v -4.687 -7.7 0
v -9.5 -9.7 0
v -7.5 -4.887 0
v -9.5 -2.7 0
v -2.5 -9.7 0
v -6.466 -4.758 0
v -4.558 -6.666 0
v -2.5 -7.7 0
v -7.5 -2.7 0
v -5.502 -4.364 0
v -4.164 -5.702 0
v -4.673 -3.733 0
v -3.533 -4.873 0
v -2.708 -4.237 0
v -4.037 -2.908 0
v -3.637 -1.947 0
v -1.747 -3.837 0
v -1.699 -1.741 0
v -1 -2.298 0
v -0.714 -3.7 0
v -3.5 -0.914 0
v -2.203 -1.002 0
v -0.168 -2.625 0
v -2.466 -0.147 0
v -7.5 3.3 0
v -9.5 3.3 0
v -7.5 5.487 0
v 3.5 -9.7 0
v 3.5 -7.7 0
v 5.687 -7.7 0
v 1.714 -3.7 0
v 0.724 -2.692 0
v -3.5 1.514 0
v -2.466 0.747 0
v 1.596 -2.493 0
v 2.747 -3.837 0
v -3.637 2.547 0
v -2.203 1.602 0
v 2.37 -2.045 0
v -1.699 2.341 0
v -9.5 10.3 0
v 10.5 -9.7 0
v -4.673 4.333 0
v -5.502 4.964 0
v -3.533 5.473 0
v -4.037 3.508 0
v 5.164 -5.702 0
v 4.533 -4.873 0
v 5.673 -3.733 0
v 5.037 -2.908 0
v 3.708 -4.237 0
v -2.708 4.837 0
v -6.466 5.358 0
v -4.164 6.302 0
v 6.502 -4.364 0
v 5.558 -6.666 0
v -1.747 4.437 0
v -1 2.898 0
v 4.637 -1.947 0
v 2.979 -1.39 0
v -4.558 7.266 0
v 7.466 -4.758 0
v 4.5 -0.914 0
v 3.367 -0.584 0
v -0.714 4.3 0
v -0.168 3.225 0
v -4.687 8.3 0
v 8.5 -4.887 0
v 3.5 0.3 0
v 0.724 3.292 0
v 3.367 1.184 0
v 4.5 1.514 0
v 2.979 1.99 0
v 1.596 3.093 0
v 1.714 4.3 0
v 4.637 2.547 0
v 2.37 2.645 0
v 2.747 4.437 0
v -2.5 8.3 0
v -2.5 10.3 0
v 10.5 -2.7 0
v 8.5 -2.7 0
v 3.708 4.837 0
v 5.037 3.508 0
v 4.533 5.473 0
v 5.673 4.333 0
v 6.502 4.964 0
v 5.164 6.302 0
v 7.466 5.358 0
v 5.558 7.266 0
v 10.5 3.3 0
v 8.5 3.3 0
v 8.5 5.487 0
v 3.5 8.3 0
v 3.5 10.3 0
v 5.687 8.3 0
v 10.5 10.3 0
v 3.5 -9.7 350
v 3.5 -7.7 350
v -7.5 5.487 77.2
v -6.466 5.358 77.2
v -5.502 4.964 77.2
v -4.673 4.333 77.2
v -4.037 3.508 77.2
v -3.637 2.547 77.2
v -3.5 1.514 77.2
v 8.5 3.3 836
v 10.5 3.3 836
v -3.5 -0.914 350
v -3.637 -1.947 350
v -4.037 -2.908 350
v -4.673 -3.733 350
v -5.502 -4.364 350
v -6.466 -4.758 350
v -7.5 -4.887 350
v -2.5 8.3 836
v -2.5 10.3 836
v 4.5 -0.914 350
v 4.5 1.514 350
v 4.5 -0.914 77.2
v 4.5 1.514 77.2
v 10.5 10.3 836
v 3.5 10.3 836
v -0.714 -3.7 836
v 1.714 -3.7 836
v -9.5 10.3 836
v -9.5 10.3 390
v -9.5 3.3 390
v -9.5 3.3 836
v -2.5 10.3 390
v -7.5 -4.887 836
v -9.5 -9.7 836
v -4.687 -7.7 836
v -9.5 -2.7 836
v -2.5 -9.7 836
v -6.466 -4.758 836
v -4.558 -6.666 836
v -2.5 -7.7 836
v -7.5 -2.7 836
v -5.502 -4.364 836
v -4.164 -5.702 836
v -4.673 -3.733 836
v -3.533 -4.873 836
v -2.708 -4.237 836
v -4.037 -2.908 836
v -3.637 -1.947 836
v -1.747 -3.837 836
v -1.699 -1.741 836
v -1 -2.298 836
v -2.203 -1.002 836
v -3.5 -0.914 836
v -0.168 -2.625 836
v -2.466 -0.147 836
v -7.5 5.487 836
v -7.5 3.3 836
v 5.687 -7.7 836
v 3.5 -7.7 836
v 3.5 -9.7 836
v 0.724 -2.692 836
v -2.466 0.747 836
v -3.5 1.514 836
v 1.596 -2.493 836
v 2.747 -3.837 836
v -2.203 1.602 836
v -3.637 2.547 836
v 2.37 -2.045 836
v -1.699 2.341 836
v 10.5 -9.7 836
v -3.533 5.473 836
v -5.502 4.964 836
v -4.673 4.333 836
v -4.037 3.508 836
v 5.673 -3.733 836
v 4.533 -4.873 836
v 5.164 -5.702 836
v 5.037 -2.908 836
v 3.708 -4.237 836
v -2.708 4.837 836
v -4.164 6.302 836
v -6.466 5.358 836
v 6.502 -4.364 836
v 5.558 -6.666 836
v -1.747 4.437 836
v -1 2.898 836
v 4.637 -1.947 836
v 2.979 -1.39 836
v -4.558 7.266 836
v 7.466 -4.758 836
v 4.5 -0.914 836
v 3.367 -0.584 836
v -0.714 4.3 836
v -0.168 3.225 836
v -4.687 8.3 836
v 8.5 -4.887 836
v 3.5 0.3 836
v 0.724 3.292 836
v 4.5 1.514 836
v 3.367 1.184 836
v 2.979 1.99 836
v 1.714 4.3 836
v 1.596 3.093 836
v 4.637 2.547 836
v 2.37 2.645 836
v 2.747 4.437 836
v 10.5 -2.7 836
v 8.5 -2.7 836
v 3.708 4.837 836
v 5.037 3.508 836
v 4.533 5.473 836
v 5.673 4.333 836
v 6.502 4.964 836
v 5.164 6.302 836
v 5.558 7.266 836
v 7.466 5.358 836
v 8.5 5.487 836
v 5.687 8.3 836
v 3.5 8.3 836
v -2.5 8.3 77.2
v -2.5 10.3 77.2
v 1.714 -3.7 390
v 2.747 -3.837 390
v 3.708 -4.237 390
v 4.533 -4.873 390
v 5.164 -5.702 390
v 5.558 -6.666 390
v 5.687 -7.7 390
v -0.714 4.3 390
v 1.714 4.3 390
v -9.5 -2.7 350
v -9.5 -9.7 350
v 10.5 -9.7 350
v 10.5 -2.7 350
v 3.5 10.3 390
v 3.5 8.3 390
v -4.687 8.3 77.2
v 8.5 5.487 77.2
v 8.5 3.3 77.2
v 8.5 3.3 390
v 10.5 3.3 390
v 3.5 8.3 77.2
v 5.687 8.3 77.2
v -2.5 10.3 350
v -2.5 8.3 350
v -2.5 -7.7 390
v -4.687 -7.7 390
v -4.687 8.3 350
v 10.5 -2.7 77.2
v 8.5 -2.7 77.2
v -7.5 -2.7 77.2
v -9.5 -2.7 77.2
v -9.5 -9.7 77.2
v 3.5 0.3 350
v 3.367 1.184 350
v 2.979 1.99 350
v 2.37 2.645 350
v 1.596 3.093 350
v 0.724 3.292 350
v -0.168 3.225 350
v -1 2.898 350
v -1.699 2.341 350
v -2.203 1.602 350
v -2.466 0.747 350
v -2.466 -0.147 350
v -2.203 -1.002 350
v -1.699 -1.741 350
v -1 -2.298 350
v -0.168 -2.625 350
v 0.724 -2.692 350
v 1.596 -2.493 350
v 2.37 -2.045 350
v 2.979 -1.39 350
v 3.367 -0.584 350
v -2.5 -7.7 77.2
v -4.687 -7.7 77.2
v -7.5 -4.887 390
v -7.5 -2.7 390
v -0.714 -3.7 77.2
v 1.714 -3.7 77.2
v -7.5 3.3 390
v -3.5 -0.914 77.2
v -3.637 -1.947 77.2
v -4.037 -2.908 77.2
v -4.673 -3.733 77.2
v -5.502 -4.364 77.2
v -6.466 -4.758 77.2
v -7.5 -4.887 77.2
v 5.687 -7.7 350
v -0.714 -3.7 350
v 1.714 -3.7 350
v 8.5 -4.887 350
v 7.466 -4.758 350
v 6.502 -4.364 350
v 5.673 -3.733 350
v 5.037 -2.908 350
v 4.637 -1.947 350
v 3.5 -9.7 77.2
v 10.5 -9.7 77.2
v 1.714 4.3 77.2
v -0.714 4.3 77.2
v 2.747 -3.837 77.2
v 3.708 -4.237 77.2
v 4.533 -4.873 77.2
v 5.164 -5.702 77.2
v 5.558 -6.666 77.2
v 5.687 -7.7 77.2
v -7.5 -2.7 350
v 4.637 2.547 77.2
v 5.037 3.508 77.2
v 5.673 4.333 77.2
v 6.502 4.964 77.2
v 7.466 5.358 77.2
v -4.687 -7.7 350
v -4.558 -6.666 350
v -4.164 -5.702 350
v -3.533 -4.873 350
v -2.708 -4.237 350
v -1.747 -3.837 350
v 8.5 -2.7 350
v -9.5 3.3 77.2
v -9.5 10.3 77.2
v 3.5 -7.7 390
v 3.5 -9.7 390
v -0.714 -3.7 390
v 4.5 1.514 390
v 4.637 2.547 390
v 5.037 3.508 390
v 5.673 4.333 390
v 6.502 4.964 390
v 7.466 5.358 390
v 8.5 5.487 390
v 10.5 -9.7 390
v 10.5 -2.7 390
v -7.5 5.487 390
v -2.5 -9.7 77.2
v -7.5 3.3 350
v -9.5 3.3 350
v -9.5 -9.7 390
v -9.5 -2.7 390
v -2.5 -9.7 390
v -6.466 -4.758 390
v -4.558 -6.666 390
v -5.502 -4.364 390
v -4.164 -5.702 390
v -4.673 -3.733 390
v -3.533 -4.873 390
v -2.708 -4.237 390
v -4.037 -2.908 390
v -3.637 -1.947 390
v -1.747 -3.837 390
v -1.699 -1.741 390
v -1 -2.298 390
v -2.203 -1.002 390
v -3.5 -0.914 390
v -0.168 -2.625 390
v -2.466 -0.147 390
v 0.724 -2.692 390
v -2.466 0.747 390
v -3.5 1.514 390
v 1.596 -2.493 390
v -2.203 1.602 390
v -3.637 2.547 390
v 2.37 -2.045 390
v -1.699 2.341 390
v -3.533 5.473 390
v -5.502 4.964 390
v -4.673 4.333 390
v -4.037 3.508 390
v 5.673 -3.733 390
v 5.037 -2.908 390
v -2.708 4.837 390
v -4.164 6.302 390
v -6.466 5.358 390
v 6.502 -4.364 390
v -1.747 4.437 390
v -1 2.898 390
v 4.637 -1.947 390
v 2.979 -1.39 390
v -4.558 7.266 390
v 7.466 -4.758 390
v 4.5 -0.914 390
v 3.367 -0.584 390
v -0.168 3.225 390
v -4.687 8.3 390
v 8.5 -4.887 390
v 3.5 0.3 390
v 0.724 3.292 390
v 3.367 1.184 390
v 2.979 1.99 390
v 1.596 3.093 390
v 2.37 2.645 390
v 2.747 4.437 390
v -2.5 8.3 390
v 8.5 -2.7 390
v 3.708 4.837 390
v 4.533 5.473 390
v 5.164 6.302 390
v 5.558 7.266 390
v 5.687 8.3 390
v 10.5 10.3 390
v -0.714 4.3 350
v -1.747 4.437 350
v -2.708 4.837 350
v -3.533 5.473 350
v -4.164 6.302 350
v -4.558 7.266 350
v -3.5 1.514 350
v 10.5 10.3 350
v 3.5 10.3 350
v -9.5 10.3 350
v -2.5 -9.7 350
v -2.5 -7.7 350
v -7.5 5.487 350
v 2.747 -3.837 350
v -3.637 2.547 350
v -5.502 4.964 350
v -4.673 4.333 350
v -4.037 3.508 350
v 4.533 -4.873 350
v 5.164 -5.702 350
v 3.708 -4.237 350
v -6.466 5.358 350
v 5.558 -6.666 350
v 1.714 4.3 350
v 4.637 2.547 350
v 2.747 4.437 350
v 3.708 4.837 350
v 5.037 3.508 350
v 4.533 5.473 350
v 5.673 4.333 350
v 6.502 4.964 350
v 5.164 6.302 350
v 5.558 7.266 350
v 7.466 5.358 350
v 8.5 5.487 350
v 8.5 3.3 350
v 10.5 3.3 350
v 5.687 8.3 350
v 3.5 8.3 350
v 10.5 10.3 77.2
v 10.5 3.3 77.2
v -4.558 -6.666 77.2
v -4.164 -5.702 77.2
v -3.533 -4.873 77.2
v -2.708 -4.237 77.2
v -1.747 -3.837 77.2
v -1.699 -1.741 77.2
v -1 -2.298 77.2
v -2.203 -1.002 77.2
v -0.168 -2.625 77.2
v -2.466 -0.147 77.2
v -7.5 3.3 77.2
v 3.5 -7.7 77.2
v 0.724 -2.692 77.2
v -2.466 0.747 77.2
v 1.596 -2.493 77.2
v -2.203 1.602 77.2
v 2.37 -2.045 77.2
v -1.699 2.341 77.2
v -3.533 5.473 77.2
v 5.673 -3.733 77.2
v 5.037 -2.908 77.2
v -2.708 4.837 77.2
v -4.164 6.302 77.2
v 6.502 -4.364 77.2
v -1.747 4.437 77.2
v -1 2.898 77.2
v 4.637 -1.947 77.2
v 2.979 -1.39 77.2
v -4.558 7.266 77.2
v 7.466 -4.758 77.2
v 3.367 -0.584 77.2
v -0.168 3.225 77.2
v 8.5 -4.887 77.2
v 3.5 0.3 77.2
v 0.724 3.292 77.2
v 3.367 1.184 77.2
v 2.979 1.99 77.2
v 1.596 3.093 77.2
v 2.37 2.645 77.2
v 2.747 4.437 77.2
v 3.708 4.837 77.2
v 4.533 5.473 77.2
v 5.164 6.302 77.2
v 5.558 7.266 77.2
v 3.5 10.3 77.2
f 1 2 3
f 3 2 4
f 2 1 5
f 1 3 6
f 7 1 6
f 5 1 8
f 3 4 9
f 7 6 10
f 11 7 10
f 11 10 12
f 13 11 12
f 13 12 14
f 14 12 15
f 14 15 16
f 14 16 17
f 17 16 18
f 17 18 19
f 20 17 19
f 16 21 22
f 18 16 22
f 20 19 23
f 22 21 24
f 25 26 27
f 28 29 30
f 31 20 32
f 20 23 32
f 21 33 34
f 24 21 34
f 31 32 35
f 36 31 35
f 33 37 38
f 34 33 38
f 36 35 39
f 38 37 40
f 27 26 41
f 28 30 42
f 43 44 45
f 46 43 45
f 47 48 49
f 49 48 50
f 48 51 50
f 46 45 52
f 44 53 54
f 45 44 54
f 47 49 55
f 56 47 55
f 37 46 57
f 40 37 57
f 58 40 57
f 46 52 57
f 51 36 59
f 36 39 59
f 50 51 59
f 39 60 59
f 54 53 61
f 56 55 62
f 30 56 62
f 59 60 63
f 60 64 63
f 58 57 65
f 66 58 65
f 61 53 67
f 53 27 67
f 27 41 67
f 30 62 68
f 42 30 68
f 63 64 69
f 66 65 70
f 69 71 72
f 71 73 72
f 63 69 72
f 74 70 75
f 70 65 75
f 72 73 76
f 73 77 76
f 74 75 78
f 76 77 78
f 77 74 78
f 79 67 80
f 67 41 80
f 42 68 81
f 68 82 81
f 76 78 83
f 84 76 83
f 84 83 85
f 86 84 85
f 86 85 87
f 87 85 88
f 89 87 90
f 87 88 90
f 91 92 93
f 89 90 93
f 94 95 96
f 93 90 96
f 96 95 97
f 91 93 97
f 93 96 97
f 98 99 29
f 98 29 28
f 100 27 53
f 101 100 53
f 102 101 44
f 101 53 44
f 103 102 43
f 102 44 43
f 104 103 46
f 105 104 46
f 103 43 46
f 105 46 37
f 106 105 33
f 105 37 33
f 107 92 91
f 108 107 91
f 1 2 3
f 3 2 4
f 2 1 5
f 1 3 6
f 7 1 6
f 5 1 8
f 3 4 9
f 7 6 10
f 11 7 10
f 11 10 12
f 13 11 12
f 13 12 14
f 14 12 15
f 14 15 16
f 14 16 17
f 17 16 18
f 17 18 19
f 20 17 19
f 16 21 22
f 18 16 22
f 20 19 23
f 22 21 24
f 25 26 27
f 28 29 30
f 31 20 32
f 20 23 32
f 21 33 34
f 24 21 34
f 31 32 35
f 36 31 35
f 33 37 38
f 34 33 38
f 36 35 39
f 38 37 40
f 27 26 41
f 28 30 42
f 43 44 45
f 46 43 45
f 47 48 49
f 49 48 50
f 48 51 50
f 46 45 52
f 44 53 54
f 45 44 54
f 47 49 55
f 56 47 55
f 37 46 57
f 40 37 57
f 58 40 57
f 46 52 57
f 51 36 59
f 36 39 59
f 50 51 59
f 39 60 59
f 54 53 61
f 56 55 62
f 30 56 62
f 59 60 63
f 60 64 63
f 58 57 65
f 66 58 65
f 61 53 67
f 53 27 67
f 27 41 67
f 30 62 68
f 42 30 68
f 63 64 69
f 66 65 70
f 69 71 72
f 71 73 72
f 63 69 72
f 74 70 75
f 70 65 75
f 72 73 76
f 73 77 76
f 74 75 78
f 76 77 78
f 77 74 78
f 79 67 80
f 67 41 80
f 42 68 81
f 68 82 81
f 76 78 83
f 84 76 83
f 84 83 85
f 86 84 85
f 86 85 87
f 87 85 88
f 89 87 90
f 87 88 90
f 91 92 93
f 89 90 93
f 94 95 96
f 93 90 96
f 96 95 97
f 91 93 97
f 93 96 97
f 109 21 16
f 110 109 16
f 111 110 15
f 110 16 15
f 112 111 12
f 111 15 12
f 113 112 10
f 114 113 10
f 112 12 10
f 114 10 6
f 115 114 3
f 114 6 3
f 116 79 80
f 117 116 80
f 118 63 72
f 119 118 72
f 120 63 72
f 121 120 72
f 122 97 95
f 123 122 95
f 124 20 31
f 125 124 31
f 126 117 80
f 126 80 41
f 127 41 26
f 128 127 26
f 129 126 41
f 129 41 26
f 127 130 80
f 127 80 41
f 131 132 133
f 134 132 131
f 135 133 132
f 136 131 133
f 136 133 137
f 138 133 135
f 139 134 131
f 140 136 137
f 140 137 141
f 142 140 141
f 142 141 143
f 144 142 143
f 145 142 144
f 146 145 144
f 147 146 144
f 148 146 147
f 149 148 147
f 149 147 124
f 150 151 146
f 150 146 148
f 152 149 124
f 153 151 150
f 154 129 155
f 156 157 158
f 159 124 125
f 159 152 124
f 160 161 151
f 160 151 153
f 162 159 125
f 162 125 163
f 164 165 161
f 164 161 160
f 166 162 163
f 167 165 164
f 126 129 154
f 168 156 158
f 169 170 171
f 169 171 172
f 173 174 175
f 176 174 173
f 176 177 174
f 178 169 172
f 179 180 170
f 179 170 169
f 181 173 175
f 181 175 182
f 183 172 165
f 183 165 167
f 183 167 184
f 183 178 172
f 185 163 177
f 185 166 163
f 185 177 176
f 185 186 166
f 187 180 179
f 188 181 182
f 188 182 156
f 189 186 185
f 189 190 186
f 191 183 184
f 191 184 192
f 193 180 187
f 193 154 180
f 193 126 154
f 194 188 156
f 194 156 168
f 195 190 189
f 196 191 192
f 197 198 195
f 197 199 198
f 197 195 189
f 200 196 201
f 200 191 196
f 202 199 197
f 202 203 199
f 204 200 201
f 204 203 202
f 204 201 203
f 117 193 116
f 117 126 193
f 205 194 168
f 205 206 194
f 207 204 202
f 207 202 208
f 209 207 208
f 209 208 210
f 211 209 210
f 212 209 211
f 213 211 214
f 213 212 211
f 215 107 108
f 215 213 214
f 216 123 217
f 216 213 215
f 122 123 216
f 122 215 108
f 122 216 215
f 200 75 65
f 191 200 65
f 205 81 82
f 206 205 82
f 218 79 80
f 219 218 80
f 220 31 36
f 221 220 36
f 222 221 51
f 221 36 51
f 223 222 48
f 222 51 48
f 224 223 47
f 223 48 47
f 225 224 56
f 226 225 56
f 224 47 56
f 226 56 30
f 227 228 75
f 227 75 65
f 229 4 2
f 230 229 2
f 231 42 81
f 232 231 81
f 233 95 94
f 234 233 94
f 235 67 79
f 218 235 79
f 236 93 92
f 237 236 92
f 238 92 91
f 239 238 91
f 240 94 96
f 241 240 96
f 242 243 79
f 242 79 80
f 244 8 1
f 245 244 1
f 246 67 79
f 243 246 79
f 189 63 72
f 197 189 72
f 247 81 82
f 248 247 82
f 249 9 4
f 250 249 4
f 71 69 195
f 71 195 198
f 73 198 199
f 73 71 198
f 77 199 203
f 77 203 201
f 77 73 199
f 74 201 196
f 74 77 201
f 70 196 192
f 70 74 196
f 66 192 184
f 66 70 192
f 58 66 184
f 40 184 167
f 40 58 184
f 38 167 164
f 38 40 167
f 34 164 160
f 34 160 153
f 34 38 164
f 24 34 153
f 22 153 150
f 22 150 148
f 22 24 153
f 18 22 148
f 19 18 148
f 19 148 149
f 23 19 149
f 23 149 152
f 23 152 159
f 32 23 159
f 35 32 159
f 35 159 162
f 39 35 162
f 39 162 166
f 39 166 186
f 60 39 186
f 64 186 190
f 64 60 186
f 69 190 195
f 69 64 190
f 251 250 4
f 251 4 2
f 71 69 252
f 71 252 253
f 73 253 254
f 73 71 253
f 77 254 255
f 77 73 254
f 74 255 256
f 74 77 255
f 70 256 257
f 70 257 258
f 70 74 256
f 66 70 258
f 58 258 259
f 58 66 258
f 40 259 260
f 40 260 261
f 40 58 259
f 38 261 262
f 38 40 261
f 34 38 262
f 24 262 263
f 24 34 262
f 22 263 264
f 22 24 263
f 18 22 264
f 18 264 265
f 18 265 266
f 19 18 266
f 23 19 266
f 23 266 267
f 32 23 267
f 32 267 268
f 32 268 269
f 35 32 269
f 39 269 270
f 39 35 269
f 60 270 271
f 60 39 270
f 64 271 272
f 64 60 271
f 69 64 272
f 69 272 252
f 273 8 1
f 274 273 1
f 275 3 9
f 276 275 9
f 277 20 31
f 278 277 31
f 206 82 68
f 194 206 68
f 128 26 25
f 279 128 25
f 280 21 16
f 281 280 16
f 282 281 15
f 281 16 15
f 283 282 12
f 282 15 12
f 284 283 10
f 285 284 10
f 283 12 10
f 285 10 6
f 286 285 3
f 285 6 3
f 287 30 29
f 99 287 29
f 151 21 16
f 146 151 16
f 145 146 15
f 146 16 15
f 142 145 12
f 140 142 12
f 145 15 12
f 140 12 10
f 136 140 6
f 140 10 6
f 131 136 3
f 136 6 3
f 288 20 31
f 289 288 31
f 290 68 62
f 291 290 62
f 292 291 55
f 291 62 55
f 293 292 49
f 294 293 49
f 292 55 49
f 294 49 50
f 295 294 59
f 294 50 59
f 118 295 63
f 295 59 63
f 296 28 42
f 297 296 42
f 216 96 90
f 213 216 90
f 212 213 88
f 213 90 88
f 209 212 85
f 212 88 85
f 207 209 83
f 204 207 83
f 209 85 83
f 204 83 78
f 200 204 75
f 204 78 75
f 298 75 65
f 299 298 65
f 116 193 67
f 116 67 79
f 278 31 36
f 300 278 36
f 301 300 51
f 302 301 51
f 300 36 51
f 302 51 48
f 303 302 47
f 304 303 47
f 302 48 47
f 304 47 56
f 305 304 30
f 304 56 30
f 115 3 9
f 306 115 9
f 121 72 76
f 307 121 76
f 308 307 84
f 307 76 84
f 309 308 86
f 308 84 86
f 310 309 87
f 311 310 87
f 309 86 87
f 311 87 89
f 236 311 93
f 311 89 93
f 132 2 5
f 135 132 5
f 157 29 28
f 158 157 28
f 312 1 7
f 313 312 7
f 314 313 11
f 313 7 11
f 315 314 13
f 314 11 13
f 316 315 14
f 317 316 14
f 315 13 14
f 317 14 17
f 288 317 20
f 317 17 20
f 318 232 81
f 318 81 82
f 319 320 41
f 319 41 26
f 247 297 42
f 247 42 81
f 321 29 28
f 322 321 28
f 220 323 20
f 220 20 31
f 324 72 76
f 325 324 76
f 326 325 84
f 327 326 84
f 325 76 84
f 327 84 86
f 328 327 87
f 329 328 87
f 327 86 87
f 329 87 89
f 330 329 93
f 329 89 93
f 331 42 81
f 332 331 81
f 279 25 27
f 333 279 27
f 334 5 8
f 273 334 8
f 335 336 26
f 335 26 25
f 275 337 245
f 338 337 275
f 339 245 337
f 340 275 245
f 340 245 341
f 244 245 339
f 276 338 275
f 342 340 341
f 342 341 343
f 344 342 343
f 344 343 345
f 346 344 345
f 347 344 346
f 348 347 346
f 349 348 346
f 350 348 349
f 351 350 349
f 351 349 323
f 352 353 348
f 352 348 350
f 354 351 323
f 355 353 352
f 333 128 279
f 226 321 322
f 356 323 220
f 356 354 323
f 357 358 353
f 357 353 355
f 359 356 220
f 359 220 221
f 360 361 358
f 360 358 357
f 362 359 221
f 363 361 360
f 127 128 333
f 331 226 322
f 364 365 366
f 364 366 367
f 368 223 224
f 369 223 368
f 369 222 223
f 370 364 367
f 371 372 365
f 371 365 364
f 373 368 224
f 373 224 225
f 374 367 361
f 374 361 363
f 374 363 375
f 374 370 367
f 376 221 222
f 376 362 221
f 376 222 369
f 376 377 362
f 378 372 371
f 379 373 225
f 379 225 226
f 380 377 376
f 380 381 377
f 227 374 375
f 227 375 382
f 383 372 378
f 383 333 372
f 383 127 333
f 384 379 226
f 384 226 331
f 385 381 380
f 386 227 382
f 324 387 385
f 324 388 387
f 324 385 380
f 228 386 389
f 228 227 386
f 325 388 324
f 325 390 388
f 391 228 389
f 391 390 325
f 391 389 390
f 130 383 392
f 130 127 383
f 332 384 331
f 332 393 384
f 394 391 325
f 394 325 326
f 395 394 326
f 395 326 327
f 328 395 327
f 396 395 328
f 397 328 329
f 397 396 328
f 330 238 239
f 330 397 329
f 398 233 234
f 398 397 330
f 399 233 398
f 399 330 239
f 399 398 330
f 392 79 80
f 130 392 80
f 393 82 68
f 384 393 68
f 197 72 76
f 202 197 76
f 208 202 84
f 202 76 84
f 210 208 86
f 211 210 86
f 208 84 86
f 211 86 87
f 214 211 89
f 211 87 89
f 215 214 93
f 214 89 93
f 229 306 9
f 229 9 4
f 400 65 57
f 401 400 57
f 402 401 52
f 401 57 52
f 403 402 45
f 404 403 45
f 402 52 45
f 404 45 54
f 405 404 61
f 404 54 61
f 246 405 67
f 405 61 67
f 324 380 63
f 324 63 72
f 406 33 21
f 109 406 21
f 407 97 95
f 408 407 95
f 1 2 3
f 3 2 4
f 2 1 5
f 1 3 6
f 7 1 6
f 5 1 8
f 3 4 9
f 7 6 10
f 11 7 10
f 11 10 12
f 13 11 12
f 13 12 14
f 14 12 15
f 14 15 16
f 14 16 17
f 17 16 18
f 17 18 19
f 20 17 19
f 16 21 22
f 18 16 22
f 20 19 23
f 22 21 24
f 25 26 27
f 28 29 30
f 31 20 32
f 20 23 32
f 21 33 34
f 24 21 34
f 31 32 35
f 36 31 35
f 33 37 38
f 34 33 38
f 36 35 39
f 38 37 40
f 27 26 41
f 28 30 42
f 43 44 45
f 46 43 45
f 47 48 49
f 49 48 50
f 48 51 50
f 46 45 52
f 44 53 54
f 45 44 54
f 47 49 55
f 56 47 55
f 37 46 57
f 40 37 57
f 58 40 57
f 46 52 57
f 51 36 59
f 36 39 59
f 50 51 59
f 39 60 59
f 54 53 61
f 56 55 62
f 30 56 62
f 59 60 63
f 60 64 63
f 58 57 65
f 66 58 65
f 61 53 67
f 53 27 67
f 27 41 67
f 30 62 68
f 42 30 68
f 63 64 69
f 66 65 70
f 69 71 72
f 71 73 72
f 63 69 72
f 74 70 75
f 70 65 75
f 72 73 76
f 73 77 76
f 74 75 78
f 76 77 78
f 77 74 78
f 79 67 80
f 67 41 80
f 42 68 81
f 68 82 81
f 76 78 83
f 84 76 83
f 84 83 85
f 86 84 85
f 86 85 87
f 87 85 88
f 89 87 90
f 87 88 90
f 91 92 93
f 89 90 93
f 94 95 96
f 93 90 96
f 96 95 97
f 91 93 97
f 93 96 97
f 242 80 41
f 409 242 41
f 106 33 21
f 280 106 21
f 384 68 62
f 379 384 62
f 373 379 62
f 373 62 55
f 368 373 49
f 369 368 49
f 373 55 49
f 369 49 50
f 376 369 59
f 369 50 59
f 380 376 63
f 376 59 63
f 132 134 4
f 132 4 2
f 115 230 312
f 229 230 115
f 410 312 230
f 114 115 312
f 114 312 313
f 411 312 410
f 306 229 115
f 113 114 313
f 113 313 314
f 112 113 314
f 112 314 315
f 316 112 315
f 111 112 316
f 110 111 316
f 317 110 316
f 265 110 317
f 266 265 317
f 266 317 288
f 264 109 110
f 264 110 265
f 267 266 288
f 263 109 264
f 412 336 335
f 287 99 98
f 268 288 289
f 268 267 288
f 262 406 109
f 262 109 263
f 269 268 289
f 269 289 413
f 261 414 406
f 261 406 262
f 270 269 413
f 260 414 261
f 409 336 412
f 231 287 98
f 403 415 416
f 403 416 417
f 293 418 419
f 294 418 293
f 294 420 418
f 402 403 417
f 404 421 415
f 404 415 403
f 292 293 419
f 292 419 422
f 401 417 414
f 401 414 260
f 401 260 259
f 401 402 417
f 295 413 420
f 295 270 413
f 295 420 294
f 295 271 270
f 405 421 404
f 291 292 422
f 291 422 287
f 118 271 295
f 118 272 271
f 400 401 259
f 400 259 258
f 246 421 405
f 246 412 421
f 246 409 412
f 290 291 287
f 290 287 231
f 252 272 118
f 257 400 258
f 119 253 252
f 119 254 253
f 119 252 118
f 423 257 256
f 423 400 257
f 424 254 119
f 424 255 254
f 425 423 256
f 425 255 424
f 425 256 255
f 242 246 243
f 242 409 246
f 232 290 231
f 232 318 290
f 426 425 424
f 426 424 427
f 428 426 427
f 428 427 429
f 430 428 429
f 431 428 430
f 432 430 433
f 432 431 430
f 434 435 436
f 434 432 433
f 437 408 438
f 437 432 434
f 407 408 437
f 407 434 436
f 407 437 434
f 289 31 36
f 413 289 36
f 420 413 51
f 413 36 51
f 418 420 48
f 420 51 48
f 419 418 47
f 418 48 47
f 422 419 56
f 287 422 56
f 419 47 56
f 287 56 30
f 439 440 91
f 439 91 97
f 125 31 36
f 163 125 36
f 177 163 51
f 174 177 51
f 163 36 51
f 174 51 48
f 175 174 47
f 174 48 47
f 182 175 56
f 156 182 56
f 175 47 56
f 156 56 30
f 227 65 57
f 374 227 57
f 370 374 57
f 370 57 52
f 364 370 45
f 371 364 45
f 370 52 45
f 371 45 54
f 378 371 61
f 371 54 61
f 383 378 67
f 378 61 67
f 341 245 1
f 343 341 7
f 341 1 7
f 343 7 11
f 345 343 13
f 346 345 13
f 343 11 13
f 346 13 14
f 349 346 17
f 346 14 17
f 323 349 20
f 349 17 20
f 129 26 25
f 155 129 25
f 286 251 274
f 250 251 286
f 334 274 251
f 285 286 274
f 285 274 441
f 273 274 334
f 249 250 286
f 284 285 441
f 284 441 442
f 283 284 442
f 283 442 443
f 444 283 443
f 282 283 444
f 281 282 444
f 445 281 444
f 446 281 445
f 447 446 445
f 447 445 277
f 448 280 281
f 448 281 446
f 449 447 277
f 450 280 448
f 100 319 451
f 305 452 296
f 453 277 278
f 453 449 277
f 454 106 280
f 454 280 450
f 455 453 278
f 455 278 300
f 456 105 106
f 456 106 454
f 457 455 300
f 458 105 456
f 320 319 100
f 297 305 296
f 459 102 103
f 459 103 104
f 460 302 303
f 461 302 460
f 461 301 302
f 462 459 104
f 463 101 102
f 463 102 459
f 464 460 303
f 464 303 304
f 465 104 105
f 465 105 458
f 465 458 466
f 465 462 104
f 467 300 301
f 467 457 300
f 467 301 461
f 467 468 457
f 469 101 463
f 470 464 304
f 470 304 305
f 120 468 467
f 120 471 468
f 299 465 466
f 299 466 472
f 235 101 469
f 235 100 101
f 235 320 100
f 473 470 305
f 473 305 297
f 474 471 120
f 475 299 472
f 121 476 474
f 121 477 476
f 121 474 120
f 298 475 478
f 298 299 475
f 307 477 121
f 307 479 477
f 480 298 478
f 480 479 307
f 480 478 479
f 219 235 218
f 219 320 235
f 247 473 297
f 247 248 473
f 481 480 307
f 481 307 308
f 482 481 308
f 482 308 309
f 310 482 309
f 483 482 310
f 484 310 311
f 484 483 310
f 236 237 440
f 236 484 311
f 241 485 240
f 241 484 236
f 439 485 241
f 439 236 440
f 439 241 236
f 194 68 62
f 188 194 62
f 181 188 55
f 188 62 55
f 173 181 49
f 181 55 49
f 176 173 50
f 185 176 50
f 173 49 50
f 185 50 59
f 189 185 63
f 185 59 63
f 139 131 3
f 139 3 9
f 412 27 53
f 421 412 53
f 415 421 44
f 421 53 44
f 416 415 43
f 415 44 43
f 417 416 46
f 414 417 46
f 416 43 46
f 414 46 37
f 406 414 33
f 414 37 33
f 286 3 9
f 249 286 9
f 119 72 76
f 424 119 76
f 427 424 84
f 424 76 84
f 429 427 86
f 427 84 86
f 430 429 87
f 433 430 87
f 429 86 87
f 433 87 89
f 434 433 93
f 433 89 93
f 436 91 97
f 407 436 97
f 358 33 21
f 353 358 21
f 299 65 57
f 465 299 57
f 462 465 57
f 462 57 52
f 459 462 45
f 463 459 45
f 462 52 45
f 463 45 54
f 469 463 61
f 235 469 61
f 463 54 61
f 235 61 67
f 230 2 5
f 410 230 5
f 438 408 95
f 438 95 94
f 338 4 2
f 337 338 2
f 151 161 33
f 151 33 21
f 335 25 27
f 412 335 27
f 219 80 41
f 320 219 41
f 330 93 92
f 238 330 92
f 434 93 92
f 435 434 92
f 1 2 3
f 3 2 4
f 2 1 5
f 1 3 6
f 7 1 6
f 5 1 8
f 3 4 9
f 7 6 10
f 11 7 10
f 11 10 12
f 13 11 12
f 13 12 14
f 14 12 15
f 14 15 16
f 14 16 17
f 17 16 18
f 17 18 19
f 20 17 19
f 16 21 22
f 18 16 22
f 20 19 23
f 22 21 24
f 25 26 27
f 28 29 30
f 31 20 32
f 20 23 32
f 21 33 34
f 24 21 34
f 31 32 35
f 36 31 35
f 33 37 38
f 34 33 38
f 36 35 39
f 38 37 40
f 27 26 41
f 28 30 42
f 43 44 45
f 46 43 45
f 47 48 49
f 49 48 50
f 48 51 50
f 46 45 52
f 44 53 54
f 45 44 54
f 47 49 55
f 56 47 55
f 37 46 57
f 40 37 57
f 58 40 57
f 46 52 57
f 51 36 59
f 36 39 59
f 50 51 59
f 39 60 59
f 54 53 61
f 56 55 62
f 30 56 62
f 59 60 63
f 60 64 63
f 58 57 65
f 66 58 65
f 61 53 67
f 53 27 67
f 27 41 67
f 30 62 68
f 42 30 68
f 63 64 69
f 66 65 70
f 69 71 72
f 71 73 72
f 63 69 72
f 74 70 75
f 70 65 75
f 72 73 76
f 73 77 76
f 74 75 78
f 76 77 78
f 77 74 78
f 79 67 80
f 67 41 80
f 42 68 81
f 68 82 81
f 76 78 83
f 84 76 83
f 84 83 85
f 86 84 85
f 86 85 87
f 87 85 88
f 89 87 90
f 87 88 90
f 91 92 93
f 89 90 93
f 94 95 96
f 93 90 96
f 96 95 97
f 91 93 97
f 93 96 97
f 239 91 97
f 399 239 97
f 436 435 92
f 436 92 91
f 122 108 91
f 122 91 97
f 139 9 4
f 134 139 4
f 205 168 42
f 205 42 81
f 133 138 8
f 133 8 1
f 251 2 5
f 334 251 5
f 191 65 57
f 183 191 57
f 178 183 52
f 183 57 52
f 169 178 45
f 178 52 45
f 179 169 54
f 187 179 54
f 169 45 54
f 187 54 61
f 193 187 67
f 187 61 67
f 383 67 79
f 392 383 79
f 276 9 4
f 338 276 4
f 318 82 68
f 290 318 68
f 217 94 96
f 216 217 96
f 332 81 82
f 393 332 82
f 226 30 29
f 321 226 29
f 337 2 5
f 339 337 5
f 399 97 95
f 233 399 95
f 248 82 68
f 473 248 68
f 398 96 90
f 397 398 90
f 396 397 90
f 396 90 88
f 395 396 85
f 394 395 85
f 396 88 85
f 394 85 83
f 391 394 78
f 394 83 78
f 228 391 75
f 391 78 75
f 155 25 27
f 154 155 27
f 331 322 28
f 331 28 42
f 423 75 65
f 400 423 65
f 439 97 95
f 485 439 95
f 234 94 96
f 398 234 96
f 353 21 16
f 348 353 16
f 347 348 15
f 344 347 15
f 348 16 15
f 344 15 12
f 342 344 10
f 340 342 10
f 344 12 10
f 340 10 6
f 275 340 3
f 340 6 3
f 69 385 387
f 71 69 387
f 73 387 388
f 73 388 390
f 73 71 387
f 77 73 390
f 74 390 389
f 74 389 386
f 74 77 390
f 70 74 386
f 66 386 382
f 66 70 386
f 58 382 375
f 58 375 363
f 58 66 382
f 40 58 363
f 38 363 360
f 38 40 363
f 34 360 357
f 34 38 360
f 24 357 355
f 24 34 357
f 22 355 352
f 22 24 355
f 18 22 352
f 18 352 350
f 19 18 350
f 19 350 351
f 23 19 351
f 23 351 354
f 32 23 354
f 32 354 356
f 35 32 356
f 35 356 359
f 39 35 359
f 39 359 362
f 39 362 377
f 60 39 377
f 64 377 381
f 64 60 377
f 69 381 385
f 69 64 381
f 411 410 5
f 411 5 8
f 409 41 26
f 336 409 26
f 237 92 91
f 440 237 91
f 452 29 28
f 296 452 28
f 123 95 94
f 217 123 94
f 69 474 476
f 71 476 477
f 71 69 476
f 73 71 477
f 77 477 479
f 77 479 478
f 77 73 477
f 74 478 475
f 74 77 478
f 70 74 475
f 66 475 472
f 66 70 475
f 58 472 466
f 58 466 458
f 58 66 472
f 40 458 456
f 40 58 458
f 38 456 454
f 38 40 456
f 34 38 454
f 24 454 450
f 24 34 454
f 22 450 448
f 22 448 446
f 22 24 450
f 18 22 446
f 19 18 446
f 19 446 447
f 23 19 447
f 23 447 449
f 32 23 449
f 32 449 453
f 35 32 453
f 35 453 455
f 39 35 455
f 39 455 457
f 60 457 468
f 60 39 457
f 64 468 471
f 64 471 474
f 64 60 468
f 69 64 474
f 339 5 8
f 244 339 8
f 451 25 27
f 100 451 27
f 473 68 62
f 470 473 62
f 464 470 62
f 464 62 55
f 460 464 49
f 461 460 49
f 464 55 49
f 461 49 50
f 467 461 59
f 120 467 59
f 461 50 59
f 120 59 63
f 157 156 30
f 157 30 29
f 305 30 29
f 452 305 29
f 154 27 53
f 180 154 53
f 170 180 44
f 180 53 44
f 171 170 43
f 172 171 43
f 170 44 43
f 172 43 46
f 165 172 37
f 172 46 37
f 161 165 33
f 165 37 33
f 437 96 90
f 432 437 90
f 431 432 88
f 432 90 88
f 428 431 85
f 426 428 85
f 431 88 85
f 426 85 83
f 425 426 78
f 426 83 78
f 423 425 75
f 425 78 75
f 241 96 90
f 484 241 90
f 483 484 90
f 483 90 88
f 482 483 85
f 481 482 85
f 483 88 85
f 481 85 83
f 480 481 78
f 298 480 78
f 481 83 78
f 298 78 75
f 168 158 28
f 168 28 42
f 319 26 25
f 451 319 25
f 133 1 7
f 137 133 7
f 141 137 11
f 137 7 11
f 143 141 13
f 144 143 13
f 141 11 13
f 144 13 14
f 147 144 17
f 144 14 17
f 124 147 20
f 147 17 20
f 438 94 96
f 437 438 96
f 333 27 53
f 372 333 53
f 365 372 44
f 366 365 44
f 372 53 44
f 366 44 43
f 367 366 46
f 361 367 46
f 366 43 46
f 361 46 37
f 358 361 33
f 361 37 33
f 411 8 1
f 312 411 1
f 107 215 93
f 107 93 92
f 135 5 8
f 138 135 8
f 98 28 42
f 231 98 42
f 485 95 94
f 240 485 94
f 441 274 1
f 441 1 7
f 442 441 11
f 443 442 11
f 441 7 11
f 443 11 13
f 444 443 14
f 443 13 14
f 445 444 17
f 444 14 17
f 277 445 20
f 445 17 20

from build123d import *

# Parameters (mm, degrees)
F0_R     = 3
F1_DEPTH = 350
F2_DEPTH = 77.2
F3_DEPTH = 390
F4_DEPTH = 836


with BuildPart() as f1:
    # F0 (on Top) → F1 (new body)
    with BuildSketch(Plane.XY):
        with BuildLine():
            Line((3.5, 10.3), (3.5, 8.3))
            Line((3.5, 8.3), (5.687252, 8.3))
            ThreePointArc((5.687252, 8.3), (4.533043, 5.473211), (1.714087, 4.3))
            Line((1.714087, 4.3), (0.5, 4.3))
            Line((0.5, 4.3), (-0.714087, 4.3))
            ThreePointArc((-0.714087, 4.3), (-3.533043, 5.473211), (-4.687252, 8.3))
            Line((-4.687252, 8.3), (-2.5, 8.3))
            Line((-2.5, 8.3), (-2.5, 10.3))
            Line((-2.5, 10.3), (-9.5, 10.3))
            Line((-9.5, 10.3), (-9.5, 3.3))
            Line((-9.5, 3.3), (-7.5, 3.3))
            Line((-7.5, 3.3), (-7.5, 5.487252))
            ThreePointArc((-7.5, 5.487252), (-4.673211, 4.333043), (-3.5, 1.514087))
            Line((-3.5, 1.514087), (-3.5, 0.3))
            Line((-3.5, 0.3), (-3.5, -0.914087))
            ThreePointArc((-3.5, -0.914087), (-4.673211, -3.733043), (-7.5, -4.887252))
            Line((-7.5, -4.887252), (-7.5, -2.7))
            Line((-7.5, -2.7), (-9.5, -2.7))
            Line((-9.5, -2.7), (-9.5, -9.7))
            Line((-9.5, -9.7), (-2.5, -9.7))
            Line((-2.5, -9.7), (-2.5, -7.7))
            Line((-2.5, -7.7), (-4.687252, -7.7))
            ThreePointArc((-4.687252, -7.7), (-3.533043, -4.873211), (-0.714087, -3.7))
            Line((-0.714087, -3.7), (0.5, -3.7))
            Line((0.5, -3.7), (1.714087, -3.7))
            ThreePointArc((1.714087, -3.7), (4.533043, -4.873211), (5.687252, -7.7))
            Line((5.687252, -7.7), (3.5, -7.7))
            Line((3.5, -7.7), (3.5, -9.7))
            Line((3.5, -9.7), (10.5, -9.7))
            Line((10.5, -9.7), (10.5, -2.7))
            Line((10.5, -2.7), (8.5, -2.7))
            Line((8.5, -2.7), (8.5, -4.887252))
            ThreePointArc((8.5, -4.887252), (5.673211, -3.733043), (4.5, -0.914087))
            Line((4.5, -0.914087), (4.5, 0.3))
            Line((4.5, 0.3), (4.5, 1.514087))
            ThreePointArc((4.5, 1.514087), (5.673211, 4.333043), (8.5, 5.487252))
            Line((8.5, 5.487252), (8.5, 3.3))
            Line((8.5, 3.3), (10.5, 3.3))
            Line((10.5, 3.3), (10.5, 10.3))
            Line((10.5, 10.3), (3.5, 10.3))
        make_face()
        with Locations((0.5, 0.3)):
            Circle(F0_R, mode=Mode.SUBTRACT)
    extrude(amount=F1_DEPTH)


with BuildPart() as f2:
    # F0 (on Top) → F2 (new body)
    with BuildSketch(Plane.XY):
        with BuildLine():
            Line((3.5, 10.3), (3.5, 8.3))
            Line((3.5, 8.3), (5.687252, 8.3))
            ThreePointArc((5.687252, 8.3), (4.533043, 5.473211), (1.714087, 4.3))
            Line((1.714087, 4.3), (0.5, 4.3))
            Line((0.5, 4.3), (-0.714087, 4.3))
            ThreePointArc((-0.714087, 4.3), (-3.533043, 5.473211), (-4.687252, 8.3))
            Line((-4.687252, 8.3), (-2.5, 8.3))
            Line((-2.5, 8.3), (-2.5, 10.3))
            Line((-2.5, 10.3), (-9.5, 10.3))
            Line((-9.5, 10.3), (-9.5, 3.3))
            Line((-9.5, 3.3), (-7.5, 3.3))
            Line((-7.5, 3.3), (-7.5, 5.487252))
            ThreePointArc((-7.5, 5.487252), (-4.673211, 4.333043), (-3.5, 1.514087))
            Line((-3.5, 1.514087), (-3.5, 0.3))
            Line((-3.5, 0.3), (-3.5, -0.914087))
            ThreePointArc((-3.5, -0.914087), (-4.673211, -3.733043), (-7.5, -4.887252))
            Line((-7.5, -4.887252), (-7.5, -2.7))
            Line((-7.5, -2.7), (-9.5, -2.7))
            Line((-9.5, -2.7), (-9.5, -9.7))
            Line((-9.5, -9.7), (-2.5, -9.7))
            Line((-2.5, -9.7), (-2.5, -7.7))
            Line((-2.5, -7.7), (-4.687252, -7.7))
            ThreePointArc((-4.687252, -7.7), (-3.533043, -4.873211), (-0.714087, -3.7))
            Line((-0.714087, -3.7), (0.5, -3.7))
            Line((0.5, -3.7), (1.714087, -3.7))
            ThreePointArc((1.714087, -3.7), (4.533043, -4.873211), (5.687252, -7.7))
            Line((5.687252, -7.7), (3.5, -7.7))
            Line((3.5, -7.7), (3.5, -9.7))
            Line((3.5, -9.7), (10.5, -9.7))
            Line((10.5, -9.7), (10.5, -2.7))
            Line((10.5, -2.7), (8.5, -2.7))
            Line((8.5, -2.7), (8.5, -4.887252))
            ThreePointArc((8.5, -4.887252), (5.673211, -3.733043), (4.5, -0.914087))
            Line((4.5, -0.914087), (4.5, 0.3))
            Line((4.5, 0.3), (4.5, 1.514087))
            ThreePointArc((4.5, 1.514087), (5.673211, 4.333043), (8.5, 5.487252))
            Line((8.5, 5.487252), (8.5, 3.3))
            Line((8.5, 3.3), (10.5, 3.3))
            Line((10.5, 3.3), (10.5, 10.3))
            Line((10.5, 10.3), (3.5, 10.3))
        make_face()
        with Locations((0.5, 0.3)):
            Circle(F0_R, mode=Mode.SUBTRACT)
    extrude(amount=F2_DEPTH)


with BuildPart() as f3:
    # F0 (on Top) → F3 (new body)
    with BuildSketch(Plane.XY):
        with BuildLine():
            Line((3.5, 10.3), (3.5, 8.3))
            Line((3.5, 8.3), (5.687252, 8.3))
            ThreePointArc((5.687252, 8.3), (4.533043, 5.473211), (1.714087, 4.3))
            Line((1.714087, 4.3), (0.5, 4.3))
            Line((0.5, 4.3), (-0.714087, 4.3))
            ThreePointArc((-0.714087, 4.3), (-3.533043, 5.473211), (-4.687252, 8.3))
            Line((-4.687252, 8.3), (-2.5, 8.3))
            Line((-2.5, 8.3), (-2.5, 10.3))
            Line((-2.5, 10.3), (-9.5, 10.3))
            Line((-9.5, 10.3), (-9.5, 3.3))
            Line((-9.5, 3.3), (-7.5, 3.3))
            Line((-7.5, 3.3), (-7.5, 5.487252))
            ThreePointArc((-7.5, 5.487252), (-4.673211, 4.333043), (-3.5, 1.514087))
            Line((-3.5, 1.514087), (-3.5, 0.3))
            Line((-3.5, 0.3), (-3.5, -0.914087))
            ThreePointArc((-3.5, -0.914087), (-4.673211, -3.733043), (-7.5, -4.887252))
            Line((-7.5, -4.887252), (-7.5, -2.7))
            Line((-7.5, -2.7), (-9.5, -2.7))
            Line((-9.5, -2.7), (-9.5, -9.7))
            Line((-9.5, -9.7), (-2.5, -9.7))
            Line((-2.5, -9.7), (-2.5, -7.7))
            Line((-2.5, -7.7), (-4.687252, -7.7))
            ThreePointArc((-4.687252, -7.7), (-3.533043, -4.873211), (-0.714087, -3.7))
            Line((-0.714087, -3.7), (0.5, -3.7))
            Line((0.5, -3.7), (1.714087, -3.7))
            ThreePointArc((1.714087, -3.7), (4.533043, -4.873211), (5.687252, -7.7))
            Line((5.687252, -7.7), (3.5, -7.7))
            Line((3.5, -7.7), (3.5, -9.7))
            Line((3.5, -9.7), (10.5, -9.7))
            Line((10.5, -9.7), (10.5, -2.7))
            Line((10.5, -2.7), (8.5, -2.7))
            Line((8.5, -2.7), (8.5, -4.887252))
            ThreePointArc((8.5, -4.887252), (5.673211, -3.733043), (4.5, -0.914087))
            Line((4.5, -0.914087), (4.5, 0.3))
            Line((4.5, 0.3), (4.5, 1.514087))
            ThreePointArc((4.5, 1.514087), (5.673211, 4.333043), (8.5, 5.487252))
            Line((8.5, 5.487252), (8.5, 3.3))
            Line((8.5, 3.3), (10.5, 3.3))
            Line((10.5, 3.3), (10.5, 10.3))
            Line((10.5, 10.3), (3.5, 10.3))
        make_face()
        with Locations((0.5, 0.3)):
            Circle(F0_R, mode=Mode.SUBTRACT)
    extrude(amount=F3_DEPTH)


with BuildPart() as f4:
    # F0 (on Top) → F4 (new body)
    with BuildSketch(Plane.XY):
        with BuildLine():
            Line((3.5, 10.3), (3.5, 8.3))
            Line((3.5, 8.3), (5.687252, 8.3))
            ThreePointArc((5.687252, 8.3), (4.533043, 5.473211), (1.714087, 4.3))
            Line((1.714087, 4.3), (0.5, 4.3))
            Line((0.5, 4.3), (-0.714087, 4.3))
            ThreePointArc((-0.714087, 4.3), (-3.533043, 5.473211), (-4.687252, 8.3))
            Line((-4.687252, 8.3), (-2.5, 8.3))
            Line((-2.5, 8.3), (-2.5, 10.3))
            Line((-2.5, 10.3), (-9.5, 10.3))
            Line((-9.5, 10.3), (-9.5, 3.3))
            Line((-9.5, 3.3), (-7.5, 3.3))
            Line((-7.5, 3.3), (-7.5, 5.487252))
            ThreePointArc((-7.5, 5.487252), (-4.673211, 4.333043), (-3.5, 1.514087))
            Line((-3.5, 1.514087), (-3.5, 0.3))
            Line((-3.5, 0.3), (-3.5, -0.914087))
            ThreePointArc((-3.5, -0.914087), (-4.673211, -3.733043), (-7.5, -4.887252))
            Line((-7.5, -4.887252), (-7.5, -2.7))
            Line((-7.5, -2.7), (-9.5, -2.7))
            Line((-9.5, -2.7), (-9.5, -9.7))
            Line((-9.5, -9.7), (-2.5, -9.7))
            Line((-2.5, -9.7), (-2.5, -7.7))
            Line((-2.5, -7.7), (-4.687252, -7.7))
            ThreePointArc((-4.687252, -7.7), (-3.533043, -4.873211), (-0.714087, -3.7))
            Line((-0.714087, -3.7), (0.5, -3.7))
            Line((0.5, -3.7), (1.714087, -3.7))
            ThreePointArc((1.714087, -3.7), (4.533043, -4.873211), (5.687252, -7.7))
            Line((5.687252, -7.7), (3.5, -7.7))
            Line((3.5, -7.7), (3.5, -9.7))
            Line((3.5, -9.7), (10.5, -9.7))
            Line((10.5, -9.7), (10.5, -2.7))
            Line((10.5, -2.7), (8.5, -2.7))
            Line((8.5, -2.7), (8.5, -4.887252))
            ThreePointArc((8.5, -4.887252), (5.673211, -3.733043), (4.5, -0.914087))
            Line((4.5, -0.914087), (4.5, 0.3))
            Line((4.5, 0.3), (4.5, 1.514087))
            ThreePointArc((4.5, 1.514087), (5.673211, 4.333043), (8.5, 5.487252))
            Line((8.5, 5.487252), (8.5, 3.3))
            Line((8.5, 3.3), (10.5, 3.3))
            Line((10.5, 3.3), (10.5, 10.3))
            Line((10.5, 10.3), (3.5, 10.3))
        make_face()
        with Locations((0.5, 0.3)):
            Circle(F0_R, mode=Mode.SUBTRACT)
    extrude(amount=F4_DEPTH)


solid = Compound([f1.part, f2.part, f3.part, f4.part])
